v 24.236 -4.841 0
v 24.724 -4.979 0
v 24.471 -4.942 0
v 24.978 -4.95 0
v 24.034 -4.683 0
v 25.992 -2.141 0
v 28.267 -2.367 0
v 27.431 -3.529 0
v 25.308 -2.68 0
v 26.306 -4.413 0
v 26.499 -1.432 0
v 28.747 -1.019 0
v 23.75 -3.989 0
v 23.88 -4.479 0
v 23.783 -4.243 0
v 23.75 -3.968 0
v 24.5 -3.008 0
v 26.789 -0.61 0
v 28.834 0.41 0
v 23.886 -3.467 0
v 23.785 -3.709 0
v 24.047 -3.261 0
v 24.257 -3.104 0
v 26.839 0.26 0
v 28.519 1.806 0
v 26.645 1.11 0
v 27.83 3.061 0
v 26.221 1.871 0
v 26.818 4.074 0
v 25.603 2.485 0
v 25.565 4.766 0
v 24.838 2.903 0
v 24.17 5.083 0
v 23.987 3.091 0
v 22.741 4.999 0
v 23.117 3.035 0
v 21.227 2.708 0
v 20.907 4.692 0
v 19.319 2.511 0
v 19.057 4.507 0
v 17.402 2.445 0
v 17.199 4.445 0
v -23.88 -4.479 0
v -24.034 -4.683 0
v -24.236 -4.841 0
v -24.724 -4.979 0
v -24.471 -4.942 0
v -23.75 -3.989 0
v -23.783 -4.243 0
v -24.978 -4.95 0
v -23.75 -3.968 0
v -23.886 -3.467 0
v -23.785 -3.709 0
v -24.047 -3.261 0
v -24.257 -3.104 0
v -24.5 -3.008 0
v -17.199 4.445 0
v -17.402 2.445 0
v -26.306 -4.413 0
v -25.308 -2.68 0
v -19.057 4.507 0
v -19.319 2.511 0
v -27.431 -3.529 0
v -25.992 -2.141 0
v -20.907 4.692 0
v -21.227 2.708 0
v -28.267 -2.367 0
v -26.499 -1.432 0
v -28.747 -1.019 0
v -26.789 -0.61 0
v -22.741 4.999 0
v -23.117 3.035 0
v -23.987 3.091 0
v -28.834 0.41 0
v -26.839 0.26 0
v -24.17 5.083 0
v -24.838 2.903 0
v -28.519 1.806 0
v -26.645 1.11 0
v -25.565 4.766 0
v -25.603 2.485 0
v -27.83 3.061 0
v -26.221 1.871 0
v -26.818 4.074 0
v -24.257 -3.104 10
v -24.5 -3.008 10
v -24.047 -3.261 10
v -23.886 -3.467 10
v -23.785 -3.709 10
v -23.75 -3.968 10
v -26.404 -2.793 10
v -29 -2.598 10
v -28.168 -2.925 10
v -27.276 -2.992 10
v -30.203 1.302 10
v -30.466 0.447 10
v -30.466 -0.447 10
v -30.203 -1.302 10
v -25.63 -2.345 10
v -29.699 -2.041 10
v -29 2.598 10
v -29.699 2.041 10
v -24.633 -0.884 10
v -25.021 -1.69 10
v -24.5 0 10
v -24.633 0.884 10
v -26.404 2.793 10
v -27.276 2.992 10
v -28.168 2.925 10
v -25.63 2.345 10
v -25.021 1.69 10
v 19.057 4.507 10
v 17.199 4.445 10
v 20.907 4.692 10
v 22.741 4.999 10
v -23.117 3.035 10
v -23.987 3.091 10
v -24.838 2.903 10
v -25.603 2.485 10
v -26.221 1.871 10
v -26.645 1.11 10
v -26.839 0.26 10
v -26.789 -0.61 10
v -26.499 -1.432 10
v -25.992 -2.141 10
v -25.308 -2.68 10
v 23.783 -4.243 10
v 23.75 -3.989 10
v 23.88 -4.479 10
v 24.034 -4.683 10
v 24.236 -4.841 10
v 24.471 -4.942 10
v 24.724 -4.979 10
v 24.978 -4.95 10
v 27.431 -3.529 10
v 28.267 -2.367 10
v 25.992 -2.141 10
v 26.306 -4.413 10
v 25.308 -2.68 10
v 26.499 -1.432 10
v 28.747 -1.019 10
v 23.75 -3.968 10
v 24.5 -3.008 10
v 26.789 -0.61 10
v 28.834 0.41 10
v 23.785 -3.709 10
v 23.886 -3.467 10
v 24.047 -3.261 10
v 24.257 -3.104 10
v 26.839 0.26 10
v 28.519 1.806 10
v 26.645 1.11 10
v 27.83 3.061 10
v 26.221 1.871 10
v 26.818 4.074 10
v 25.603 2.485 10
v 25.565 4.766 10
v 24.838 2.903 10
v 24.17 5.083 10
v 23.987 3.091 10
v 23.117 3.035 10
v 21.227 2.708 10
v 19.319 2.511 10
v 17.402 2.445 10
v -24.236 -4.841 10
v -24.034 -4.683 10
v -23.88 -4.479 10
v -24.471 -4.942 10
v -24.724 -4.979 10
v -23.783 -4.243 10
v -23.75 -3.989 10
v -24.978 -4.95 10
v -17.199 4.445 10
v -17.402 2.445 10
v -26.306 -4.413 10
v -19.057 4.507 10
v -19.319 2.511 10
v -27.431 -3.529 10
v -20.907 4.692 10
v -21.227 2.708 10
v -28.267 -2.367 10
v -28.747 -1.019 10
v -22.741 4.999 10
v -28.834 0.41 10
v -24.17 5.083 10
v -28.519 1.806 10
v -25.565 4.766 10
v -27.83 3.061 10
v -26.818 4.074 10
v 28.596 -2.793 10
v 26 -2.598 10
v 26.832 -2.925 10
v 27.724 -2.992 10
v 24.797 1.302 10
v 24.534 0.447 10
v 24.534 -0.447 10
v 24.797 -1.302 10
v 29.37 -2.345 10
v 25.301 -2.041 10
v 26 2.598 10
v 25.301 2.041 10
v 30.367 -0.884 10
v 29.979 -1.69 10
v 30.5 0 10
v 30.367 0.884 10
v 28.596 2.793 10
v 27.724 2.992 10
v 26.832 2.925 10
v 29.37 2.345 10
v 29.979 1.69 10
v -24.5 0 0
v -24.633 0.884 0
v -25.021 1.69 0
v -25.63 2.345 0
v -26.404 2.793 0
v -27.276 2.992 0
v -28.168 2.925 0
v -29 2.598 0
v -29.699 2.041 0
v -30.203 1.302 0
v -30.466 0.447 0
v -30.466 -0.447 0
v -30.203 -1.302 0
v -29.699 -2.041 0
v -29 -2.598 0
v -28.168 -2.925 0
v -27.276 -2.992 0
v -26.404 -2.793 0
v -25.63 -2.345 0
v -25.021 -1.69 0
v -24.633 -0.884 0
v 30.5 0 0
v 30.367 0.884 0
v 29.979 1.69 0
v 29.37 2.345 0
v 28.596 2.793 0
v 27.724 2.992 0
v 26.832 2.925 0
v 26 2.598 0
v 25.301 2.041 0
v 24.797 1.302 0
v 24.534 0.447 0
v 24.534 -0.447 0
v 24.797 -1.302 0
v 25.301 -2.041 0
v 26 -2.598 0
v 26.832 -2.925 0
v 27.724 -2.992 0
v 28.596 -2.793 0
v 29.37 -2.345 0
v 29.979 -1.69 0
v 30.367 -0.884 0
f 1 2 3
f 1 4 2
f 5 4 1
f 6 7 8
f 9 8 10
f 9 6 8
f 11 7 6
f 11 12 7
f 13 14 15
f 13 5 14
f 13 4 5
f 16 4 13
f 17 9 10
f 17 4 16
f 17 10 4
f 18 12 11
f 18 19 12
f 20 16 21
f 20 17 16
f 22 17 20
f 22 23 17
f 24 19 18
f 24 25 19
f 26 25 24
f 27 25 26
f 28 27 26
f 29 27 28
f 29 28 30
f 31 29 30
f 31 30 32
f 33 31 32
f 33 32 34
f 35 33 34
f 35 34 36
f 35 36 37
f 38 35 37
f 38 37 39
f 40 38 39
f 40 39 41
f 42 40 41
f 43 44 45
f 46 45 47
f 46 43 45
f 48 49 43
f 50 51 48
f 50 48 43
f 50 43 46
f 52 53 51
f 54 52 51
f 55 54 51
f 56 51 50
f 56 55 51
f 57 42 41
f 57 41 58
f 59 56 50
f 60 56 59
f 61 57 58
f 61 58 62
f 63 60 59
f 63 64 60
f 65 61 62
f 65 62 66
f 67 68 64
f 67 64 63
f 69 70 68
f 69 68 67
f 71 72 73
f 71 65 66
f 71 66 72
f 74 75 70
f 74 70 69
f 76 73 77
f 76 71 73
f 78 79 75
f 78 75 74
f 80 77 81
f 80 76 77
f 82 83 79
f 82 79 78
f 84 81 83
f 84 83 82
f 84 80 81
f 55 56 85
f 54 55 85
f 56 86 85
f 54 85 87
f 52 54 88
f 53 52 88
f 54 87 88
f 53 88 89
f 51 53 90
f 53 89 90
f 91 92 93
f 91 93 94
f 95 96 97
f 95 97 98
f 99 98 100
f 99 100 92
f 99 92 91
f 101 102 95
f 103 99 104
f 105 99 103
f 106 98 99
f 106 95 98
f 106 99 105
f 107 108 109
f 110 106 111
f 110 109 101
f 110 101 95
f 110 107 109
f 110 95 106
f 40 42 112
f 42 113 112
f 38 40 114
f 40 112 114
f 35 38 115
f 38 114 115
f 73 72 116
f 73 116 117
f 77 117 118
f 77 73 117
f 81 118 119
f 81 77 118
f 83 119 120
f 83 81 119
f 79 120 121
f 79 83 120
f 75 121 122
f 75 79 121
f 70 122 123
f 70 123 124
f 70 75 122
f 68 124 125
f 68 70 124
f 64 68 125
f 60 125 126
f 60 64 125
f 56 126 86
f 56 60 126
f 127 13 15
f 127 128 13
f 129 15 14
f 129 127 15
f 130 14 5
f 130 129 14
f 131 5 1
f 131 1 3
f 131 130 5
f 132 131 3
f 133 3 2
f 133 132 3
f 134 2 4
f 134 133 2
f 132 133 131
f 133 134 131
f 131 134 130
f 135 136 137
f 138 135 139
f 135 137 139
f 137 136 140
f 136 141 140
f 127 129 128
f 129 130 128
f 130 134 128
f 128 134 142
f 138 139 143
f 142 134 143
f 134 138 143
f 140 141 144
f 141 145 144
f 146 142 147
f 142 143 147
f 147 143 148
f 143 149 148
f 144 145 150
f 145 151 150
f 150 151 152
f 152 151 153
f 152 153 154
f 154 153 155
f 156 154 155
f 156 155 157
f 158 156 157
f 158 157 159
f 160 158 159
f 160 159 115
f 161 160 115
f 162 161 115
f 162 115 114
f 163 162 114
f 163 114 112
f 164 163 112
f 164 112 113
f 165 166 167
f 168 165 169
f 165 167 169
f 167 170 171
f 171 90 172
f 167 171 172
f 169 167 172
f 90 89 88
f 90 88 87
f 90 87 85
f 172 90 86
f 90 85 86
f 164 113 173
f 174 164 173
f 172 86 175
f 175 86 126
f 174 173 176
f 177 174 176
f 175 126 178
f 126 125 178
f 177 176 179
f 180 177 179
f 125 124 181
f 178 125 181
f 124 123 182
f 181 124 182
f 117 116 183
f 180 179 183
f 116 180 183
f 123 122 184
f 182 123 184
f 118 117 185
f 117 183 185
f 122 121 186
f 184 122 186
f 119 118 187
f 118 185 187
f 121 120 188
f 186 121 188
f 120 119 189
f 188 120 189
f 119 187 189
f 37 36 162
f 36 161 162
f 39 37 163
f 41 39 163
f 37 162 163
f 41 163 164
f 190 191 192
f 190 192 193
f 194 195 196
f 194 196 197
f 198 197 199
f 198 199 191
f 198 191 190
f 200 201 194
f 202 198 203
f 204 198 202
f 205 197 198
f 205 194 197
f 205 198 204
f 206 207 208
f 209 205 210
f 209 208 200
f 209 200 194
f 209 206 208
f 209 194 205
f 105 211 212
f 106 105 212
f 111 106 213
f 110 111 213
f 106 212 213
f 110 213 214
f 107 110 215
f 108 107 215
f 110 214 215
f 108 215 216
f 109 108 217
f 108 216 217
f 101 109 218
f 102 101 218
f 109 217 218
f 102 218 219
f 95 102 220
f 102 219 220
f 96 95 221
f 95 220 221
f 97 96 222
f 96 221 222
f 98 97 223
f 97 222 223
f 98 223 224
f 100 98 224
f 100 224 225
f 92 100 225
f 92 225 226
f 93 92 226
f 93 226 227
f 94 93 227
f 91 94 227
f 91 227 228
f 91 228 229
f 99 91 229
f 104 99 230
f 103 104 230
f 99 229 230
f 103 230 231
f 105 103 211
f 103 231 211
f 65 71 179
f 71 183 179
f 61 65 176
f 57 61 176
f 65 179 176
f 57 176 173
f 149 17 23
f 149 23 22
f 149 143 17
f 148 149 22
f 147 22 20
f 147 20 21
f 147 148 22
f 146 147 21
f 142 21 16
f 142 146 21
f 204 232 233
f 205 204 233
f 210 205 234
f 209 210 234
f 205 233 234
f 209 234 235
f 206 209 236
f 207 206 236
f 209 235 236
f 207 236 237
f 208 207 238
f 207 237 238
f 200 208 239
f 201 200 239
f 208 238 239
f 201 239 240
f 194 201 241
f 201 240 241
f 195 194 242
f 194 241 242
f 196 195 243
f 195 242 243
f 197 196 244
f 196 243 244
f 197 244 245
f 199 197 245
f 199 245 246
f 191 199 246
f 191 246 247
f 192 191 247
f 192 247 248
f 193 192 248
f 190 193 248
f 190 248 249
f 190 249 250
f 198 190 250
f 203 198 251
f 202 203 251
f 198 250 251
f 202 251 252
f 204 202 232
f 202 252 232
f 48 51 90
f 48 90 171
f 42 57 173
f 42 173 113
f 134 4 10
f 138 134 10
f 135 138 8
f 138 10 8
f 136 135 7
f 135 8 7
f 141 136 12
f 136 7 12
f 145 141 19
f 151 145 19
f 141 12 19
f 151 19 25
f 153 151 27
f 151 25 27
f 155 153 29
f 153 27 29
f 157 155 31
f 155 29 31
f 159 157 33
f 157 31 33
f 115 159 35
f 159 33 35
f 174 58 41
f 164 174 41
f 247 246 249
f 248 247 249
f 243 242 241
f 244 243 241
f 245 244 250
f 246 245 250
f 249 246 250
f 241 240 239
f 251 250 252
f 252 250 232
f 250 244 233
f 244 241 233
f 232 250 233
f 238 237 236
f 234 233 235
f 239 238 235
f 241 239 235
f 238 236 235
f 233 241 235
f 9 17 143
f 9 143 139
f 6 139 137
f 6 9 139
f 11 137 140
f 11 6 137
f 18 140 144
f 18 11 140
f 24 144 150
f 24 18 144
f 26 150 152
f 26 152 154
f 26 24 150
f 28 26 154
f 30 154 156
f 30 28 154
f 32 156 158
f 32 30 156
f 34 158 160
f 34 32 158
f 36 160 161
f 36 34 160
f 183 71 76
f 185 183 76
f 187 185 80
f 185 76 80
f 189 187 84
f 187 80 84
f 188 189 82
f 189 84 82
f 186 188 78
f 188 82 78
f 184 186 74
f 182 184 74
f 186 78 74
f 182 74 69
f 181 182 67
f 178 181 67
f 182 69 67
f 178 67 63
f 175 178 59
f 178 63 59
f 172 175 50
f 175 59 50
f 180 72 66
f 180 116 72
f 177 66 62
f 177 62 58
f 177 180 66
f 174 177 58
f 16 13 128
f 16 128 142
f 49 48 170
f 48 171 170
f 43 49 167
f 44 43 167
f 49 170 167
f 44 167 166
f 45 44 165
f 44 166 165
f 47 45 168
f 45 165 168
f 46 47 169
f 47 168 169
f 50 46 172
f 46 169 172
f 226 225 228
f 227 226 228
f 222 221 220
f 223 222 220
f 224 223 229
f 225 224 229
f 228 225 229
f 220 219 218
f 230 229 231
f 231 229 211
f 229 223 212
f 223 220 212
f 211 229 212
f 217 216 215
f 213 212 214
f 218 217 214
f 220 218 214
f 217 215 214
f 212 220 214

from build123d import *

# Parameters (mm, degrees)
SKETCH_R     = 3
PAD_DEPTH    = 10
PAD001_DEPTH = 10
FILLET_R     = 28
FILLET001_R  = 0.99


with BuildPart() as pad:
    # Sketch → Pad (new body)
    with BuildSketch(Plane.XY):
        with Locations((-27.5, 0)):
            Circle(SKETCH_R)
        with Locations((27.5, 0)):
            Circle(SKETCH_R)
    extrude(amount=PAD_DEPTH)


with BuildPart() as fillet001:
    # Sketch001 → Pad001 (new body)
    with BuildSketch(Plane.XY):
        with BuildLine():
            ThreePointArc((-21.844511, 2.445222), (-26.681739, 1.007425), (-23.75, -3.1))
            Line((-23.75, -3.1), (-23.75, -5.1))
            ThreePointArc((-21.25, 4.445222), (-28.683591, 1.292162), (-23.75, -5.1))
            Line((-21.25, 4.445222), (21.25, 4.445222))
            ThreePointArc((23.75, -5.1), (28.683591, 1.292162), (21.25, 4.445222))
            Line((23.75, -5.1), (23.75, -3.1))
            ThreePointArc((23.75, -3.1), (26.681739, 1.007425), (21.844511, 2.445222))
            Line((-21.844511, 2.445222), (21.844511, 2.445222))
        make_face()
    extrude(amount=PAD001_DEPTH)

    # Fillet
    fillet_edges = [fillet001.edges().sort_by_distance(p)[0] for p in [
        (21.25, 4.445222, 5),
        (-21.25, 4.445222, 5),
        (-21.844511, 2.445222, 5),
        (21.844511, 2.445222, 5),
    ]]
    fillet(fillet_edges, radius=FILLET_R)

    # Fillet001
    fillet001_edges = [fillet001.edges().sort_by_distance(p)[0] for p in [
        (-23.75, -5.1, 5),
        (-23.75, -3.1, 5),
        (23.75, -3.1, 5),
        (23.75, -5.1, 5),
    ]]
    fillet(fillet001_edges, radius=FILLET001_R)


solid = Compound([pad.part, fillet001.part])
